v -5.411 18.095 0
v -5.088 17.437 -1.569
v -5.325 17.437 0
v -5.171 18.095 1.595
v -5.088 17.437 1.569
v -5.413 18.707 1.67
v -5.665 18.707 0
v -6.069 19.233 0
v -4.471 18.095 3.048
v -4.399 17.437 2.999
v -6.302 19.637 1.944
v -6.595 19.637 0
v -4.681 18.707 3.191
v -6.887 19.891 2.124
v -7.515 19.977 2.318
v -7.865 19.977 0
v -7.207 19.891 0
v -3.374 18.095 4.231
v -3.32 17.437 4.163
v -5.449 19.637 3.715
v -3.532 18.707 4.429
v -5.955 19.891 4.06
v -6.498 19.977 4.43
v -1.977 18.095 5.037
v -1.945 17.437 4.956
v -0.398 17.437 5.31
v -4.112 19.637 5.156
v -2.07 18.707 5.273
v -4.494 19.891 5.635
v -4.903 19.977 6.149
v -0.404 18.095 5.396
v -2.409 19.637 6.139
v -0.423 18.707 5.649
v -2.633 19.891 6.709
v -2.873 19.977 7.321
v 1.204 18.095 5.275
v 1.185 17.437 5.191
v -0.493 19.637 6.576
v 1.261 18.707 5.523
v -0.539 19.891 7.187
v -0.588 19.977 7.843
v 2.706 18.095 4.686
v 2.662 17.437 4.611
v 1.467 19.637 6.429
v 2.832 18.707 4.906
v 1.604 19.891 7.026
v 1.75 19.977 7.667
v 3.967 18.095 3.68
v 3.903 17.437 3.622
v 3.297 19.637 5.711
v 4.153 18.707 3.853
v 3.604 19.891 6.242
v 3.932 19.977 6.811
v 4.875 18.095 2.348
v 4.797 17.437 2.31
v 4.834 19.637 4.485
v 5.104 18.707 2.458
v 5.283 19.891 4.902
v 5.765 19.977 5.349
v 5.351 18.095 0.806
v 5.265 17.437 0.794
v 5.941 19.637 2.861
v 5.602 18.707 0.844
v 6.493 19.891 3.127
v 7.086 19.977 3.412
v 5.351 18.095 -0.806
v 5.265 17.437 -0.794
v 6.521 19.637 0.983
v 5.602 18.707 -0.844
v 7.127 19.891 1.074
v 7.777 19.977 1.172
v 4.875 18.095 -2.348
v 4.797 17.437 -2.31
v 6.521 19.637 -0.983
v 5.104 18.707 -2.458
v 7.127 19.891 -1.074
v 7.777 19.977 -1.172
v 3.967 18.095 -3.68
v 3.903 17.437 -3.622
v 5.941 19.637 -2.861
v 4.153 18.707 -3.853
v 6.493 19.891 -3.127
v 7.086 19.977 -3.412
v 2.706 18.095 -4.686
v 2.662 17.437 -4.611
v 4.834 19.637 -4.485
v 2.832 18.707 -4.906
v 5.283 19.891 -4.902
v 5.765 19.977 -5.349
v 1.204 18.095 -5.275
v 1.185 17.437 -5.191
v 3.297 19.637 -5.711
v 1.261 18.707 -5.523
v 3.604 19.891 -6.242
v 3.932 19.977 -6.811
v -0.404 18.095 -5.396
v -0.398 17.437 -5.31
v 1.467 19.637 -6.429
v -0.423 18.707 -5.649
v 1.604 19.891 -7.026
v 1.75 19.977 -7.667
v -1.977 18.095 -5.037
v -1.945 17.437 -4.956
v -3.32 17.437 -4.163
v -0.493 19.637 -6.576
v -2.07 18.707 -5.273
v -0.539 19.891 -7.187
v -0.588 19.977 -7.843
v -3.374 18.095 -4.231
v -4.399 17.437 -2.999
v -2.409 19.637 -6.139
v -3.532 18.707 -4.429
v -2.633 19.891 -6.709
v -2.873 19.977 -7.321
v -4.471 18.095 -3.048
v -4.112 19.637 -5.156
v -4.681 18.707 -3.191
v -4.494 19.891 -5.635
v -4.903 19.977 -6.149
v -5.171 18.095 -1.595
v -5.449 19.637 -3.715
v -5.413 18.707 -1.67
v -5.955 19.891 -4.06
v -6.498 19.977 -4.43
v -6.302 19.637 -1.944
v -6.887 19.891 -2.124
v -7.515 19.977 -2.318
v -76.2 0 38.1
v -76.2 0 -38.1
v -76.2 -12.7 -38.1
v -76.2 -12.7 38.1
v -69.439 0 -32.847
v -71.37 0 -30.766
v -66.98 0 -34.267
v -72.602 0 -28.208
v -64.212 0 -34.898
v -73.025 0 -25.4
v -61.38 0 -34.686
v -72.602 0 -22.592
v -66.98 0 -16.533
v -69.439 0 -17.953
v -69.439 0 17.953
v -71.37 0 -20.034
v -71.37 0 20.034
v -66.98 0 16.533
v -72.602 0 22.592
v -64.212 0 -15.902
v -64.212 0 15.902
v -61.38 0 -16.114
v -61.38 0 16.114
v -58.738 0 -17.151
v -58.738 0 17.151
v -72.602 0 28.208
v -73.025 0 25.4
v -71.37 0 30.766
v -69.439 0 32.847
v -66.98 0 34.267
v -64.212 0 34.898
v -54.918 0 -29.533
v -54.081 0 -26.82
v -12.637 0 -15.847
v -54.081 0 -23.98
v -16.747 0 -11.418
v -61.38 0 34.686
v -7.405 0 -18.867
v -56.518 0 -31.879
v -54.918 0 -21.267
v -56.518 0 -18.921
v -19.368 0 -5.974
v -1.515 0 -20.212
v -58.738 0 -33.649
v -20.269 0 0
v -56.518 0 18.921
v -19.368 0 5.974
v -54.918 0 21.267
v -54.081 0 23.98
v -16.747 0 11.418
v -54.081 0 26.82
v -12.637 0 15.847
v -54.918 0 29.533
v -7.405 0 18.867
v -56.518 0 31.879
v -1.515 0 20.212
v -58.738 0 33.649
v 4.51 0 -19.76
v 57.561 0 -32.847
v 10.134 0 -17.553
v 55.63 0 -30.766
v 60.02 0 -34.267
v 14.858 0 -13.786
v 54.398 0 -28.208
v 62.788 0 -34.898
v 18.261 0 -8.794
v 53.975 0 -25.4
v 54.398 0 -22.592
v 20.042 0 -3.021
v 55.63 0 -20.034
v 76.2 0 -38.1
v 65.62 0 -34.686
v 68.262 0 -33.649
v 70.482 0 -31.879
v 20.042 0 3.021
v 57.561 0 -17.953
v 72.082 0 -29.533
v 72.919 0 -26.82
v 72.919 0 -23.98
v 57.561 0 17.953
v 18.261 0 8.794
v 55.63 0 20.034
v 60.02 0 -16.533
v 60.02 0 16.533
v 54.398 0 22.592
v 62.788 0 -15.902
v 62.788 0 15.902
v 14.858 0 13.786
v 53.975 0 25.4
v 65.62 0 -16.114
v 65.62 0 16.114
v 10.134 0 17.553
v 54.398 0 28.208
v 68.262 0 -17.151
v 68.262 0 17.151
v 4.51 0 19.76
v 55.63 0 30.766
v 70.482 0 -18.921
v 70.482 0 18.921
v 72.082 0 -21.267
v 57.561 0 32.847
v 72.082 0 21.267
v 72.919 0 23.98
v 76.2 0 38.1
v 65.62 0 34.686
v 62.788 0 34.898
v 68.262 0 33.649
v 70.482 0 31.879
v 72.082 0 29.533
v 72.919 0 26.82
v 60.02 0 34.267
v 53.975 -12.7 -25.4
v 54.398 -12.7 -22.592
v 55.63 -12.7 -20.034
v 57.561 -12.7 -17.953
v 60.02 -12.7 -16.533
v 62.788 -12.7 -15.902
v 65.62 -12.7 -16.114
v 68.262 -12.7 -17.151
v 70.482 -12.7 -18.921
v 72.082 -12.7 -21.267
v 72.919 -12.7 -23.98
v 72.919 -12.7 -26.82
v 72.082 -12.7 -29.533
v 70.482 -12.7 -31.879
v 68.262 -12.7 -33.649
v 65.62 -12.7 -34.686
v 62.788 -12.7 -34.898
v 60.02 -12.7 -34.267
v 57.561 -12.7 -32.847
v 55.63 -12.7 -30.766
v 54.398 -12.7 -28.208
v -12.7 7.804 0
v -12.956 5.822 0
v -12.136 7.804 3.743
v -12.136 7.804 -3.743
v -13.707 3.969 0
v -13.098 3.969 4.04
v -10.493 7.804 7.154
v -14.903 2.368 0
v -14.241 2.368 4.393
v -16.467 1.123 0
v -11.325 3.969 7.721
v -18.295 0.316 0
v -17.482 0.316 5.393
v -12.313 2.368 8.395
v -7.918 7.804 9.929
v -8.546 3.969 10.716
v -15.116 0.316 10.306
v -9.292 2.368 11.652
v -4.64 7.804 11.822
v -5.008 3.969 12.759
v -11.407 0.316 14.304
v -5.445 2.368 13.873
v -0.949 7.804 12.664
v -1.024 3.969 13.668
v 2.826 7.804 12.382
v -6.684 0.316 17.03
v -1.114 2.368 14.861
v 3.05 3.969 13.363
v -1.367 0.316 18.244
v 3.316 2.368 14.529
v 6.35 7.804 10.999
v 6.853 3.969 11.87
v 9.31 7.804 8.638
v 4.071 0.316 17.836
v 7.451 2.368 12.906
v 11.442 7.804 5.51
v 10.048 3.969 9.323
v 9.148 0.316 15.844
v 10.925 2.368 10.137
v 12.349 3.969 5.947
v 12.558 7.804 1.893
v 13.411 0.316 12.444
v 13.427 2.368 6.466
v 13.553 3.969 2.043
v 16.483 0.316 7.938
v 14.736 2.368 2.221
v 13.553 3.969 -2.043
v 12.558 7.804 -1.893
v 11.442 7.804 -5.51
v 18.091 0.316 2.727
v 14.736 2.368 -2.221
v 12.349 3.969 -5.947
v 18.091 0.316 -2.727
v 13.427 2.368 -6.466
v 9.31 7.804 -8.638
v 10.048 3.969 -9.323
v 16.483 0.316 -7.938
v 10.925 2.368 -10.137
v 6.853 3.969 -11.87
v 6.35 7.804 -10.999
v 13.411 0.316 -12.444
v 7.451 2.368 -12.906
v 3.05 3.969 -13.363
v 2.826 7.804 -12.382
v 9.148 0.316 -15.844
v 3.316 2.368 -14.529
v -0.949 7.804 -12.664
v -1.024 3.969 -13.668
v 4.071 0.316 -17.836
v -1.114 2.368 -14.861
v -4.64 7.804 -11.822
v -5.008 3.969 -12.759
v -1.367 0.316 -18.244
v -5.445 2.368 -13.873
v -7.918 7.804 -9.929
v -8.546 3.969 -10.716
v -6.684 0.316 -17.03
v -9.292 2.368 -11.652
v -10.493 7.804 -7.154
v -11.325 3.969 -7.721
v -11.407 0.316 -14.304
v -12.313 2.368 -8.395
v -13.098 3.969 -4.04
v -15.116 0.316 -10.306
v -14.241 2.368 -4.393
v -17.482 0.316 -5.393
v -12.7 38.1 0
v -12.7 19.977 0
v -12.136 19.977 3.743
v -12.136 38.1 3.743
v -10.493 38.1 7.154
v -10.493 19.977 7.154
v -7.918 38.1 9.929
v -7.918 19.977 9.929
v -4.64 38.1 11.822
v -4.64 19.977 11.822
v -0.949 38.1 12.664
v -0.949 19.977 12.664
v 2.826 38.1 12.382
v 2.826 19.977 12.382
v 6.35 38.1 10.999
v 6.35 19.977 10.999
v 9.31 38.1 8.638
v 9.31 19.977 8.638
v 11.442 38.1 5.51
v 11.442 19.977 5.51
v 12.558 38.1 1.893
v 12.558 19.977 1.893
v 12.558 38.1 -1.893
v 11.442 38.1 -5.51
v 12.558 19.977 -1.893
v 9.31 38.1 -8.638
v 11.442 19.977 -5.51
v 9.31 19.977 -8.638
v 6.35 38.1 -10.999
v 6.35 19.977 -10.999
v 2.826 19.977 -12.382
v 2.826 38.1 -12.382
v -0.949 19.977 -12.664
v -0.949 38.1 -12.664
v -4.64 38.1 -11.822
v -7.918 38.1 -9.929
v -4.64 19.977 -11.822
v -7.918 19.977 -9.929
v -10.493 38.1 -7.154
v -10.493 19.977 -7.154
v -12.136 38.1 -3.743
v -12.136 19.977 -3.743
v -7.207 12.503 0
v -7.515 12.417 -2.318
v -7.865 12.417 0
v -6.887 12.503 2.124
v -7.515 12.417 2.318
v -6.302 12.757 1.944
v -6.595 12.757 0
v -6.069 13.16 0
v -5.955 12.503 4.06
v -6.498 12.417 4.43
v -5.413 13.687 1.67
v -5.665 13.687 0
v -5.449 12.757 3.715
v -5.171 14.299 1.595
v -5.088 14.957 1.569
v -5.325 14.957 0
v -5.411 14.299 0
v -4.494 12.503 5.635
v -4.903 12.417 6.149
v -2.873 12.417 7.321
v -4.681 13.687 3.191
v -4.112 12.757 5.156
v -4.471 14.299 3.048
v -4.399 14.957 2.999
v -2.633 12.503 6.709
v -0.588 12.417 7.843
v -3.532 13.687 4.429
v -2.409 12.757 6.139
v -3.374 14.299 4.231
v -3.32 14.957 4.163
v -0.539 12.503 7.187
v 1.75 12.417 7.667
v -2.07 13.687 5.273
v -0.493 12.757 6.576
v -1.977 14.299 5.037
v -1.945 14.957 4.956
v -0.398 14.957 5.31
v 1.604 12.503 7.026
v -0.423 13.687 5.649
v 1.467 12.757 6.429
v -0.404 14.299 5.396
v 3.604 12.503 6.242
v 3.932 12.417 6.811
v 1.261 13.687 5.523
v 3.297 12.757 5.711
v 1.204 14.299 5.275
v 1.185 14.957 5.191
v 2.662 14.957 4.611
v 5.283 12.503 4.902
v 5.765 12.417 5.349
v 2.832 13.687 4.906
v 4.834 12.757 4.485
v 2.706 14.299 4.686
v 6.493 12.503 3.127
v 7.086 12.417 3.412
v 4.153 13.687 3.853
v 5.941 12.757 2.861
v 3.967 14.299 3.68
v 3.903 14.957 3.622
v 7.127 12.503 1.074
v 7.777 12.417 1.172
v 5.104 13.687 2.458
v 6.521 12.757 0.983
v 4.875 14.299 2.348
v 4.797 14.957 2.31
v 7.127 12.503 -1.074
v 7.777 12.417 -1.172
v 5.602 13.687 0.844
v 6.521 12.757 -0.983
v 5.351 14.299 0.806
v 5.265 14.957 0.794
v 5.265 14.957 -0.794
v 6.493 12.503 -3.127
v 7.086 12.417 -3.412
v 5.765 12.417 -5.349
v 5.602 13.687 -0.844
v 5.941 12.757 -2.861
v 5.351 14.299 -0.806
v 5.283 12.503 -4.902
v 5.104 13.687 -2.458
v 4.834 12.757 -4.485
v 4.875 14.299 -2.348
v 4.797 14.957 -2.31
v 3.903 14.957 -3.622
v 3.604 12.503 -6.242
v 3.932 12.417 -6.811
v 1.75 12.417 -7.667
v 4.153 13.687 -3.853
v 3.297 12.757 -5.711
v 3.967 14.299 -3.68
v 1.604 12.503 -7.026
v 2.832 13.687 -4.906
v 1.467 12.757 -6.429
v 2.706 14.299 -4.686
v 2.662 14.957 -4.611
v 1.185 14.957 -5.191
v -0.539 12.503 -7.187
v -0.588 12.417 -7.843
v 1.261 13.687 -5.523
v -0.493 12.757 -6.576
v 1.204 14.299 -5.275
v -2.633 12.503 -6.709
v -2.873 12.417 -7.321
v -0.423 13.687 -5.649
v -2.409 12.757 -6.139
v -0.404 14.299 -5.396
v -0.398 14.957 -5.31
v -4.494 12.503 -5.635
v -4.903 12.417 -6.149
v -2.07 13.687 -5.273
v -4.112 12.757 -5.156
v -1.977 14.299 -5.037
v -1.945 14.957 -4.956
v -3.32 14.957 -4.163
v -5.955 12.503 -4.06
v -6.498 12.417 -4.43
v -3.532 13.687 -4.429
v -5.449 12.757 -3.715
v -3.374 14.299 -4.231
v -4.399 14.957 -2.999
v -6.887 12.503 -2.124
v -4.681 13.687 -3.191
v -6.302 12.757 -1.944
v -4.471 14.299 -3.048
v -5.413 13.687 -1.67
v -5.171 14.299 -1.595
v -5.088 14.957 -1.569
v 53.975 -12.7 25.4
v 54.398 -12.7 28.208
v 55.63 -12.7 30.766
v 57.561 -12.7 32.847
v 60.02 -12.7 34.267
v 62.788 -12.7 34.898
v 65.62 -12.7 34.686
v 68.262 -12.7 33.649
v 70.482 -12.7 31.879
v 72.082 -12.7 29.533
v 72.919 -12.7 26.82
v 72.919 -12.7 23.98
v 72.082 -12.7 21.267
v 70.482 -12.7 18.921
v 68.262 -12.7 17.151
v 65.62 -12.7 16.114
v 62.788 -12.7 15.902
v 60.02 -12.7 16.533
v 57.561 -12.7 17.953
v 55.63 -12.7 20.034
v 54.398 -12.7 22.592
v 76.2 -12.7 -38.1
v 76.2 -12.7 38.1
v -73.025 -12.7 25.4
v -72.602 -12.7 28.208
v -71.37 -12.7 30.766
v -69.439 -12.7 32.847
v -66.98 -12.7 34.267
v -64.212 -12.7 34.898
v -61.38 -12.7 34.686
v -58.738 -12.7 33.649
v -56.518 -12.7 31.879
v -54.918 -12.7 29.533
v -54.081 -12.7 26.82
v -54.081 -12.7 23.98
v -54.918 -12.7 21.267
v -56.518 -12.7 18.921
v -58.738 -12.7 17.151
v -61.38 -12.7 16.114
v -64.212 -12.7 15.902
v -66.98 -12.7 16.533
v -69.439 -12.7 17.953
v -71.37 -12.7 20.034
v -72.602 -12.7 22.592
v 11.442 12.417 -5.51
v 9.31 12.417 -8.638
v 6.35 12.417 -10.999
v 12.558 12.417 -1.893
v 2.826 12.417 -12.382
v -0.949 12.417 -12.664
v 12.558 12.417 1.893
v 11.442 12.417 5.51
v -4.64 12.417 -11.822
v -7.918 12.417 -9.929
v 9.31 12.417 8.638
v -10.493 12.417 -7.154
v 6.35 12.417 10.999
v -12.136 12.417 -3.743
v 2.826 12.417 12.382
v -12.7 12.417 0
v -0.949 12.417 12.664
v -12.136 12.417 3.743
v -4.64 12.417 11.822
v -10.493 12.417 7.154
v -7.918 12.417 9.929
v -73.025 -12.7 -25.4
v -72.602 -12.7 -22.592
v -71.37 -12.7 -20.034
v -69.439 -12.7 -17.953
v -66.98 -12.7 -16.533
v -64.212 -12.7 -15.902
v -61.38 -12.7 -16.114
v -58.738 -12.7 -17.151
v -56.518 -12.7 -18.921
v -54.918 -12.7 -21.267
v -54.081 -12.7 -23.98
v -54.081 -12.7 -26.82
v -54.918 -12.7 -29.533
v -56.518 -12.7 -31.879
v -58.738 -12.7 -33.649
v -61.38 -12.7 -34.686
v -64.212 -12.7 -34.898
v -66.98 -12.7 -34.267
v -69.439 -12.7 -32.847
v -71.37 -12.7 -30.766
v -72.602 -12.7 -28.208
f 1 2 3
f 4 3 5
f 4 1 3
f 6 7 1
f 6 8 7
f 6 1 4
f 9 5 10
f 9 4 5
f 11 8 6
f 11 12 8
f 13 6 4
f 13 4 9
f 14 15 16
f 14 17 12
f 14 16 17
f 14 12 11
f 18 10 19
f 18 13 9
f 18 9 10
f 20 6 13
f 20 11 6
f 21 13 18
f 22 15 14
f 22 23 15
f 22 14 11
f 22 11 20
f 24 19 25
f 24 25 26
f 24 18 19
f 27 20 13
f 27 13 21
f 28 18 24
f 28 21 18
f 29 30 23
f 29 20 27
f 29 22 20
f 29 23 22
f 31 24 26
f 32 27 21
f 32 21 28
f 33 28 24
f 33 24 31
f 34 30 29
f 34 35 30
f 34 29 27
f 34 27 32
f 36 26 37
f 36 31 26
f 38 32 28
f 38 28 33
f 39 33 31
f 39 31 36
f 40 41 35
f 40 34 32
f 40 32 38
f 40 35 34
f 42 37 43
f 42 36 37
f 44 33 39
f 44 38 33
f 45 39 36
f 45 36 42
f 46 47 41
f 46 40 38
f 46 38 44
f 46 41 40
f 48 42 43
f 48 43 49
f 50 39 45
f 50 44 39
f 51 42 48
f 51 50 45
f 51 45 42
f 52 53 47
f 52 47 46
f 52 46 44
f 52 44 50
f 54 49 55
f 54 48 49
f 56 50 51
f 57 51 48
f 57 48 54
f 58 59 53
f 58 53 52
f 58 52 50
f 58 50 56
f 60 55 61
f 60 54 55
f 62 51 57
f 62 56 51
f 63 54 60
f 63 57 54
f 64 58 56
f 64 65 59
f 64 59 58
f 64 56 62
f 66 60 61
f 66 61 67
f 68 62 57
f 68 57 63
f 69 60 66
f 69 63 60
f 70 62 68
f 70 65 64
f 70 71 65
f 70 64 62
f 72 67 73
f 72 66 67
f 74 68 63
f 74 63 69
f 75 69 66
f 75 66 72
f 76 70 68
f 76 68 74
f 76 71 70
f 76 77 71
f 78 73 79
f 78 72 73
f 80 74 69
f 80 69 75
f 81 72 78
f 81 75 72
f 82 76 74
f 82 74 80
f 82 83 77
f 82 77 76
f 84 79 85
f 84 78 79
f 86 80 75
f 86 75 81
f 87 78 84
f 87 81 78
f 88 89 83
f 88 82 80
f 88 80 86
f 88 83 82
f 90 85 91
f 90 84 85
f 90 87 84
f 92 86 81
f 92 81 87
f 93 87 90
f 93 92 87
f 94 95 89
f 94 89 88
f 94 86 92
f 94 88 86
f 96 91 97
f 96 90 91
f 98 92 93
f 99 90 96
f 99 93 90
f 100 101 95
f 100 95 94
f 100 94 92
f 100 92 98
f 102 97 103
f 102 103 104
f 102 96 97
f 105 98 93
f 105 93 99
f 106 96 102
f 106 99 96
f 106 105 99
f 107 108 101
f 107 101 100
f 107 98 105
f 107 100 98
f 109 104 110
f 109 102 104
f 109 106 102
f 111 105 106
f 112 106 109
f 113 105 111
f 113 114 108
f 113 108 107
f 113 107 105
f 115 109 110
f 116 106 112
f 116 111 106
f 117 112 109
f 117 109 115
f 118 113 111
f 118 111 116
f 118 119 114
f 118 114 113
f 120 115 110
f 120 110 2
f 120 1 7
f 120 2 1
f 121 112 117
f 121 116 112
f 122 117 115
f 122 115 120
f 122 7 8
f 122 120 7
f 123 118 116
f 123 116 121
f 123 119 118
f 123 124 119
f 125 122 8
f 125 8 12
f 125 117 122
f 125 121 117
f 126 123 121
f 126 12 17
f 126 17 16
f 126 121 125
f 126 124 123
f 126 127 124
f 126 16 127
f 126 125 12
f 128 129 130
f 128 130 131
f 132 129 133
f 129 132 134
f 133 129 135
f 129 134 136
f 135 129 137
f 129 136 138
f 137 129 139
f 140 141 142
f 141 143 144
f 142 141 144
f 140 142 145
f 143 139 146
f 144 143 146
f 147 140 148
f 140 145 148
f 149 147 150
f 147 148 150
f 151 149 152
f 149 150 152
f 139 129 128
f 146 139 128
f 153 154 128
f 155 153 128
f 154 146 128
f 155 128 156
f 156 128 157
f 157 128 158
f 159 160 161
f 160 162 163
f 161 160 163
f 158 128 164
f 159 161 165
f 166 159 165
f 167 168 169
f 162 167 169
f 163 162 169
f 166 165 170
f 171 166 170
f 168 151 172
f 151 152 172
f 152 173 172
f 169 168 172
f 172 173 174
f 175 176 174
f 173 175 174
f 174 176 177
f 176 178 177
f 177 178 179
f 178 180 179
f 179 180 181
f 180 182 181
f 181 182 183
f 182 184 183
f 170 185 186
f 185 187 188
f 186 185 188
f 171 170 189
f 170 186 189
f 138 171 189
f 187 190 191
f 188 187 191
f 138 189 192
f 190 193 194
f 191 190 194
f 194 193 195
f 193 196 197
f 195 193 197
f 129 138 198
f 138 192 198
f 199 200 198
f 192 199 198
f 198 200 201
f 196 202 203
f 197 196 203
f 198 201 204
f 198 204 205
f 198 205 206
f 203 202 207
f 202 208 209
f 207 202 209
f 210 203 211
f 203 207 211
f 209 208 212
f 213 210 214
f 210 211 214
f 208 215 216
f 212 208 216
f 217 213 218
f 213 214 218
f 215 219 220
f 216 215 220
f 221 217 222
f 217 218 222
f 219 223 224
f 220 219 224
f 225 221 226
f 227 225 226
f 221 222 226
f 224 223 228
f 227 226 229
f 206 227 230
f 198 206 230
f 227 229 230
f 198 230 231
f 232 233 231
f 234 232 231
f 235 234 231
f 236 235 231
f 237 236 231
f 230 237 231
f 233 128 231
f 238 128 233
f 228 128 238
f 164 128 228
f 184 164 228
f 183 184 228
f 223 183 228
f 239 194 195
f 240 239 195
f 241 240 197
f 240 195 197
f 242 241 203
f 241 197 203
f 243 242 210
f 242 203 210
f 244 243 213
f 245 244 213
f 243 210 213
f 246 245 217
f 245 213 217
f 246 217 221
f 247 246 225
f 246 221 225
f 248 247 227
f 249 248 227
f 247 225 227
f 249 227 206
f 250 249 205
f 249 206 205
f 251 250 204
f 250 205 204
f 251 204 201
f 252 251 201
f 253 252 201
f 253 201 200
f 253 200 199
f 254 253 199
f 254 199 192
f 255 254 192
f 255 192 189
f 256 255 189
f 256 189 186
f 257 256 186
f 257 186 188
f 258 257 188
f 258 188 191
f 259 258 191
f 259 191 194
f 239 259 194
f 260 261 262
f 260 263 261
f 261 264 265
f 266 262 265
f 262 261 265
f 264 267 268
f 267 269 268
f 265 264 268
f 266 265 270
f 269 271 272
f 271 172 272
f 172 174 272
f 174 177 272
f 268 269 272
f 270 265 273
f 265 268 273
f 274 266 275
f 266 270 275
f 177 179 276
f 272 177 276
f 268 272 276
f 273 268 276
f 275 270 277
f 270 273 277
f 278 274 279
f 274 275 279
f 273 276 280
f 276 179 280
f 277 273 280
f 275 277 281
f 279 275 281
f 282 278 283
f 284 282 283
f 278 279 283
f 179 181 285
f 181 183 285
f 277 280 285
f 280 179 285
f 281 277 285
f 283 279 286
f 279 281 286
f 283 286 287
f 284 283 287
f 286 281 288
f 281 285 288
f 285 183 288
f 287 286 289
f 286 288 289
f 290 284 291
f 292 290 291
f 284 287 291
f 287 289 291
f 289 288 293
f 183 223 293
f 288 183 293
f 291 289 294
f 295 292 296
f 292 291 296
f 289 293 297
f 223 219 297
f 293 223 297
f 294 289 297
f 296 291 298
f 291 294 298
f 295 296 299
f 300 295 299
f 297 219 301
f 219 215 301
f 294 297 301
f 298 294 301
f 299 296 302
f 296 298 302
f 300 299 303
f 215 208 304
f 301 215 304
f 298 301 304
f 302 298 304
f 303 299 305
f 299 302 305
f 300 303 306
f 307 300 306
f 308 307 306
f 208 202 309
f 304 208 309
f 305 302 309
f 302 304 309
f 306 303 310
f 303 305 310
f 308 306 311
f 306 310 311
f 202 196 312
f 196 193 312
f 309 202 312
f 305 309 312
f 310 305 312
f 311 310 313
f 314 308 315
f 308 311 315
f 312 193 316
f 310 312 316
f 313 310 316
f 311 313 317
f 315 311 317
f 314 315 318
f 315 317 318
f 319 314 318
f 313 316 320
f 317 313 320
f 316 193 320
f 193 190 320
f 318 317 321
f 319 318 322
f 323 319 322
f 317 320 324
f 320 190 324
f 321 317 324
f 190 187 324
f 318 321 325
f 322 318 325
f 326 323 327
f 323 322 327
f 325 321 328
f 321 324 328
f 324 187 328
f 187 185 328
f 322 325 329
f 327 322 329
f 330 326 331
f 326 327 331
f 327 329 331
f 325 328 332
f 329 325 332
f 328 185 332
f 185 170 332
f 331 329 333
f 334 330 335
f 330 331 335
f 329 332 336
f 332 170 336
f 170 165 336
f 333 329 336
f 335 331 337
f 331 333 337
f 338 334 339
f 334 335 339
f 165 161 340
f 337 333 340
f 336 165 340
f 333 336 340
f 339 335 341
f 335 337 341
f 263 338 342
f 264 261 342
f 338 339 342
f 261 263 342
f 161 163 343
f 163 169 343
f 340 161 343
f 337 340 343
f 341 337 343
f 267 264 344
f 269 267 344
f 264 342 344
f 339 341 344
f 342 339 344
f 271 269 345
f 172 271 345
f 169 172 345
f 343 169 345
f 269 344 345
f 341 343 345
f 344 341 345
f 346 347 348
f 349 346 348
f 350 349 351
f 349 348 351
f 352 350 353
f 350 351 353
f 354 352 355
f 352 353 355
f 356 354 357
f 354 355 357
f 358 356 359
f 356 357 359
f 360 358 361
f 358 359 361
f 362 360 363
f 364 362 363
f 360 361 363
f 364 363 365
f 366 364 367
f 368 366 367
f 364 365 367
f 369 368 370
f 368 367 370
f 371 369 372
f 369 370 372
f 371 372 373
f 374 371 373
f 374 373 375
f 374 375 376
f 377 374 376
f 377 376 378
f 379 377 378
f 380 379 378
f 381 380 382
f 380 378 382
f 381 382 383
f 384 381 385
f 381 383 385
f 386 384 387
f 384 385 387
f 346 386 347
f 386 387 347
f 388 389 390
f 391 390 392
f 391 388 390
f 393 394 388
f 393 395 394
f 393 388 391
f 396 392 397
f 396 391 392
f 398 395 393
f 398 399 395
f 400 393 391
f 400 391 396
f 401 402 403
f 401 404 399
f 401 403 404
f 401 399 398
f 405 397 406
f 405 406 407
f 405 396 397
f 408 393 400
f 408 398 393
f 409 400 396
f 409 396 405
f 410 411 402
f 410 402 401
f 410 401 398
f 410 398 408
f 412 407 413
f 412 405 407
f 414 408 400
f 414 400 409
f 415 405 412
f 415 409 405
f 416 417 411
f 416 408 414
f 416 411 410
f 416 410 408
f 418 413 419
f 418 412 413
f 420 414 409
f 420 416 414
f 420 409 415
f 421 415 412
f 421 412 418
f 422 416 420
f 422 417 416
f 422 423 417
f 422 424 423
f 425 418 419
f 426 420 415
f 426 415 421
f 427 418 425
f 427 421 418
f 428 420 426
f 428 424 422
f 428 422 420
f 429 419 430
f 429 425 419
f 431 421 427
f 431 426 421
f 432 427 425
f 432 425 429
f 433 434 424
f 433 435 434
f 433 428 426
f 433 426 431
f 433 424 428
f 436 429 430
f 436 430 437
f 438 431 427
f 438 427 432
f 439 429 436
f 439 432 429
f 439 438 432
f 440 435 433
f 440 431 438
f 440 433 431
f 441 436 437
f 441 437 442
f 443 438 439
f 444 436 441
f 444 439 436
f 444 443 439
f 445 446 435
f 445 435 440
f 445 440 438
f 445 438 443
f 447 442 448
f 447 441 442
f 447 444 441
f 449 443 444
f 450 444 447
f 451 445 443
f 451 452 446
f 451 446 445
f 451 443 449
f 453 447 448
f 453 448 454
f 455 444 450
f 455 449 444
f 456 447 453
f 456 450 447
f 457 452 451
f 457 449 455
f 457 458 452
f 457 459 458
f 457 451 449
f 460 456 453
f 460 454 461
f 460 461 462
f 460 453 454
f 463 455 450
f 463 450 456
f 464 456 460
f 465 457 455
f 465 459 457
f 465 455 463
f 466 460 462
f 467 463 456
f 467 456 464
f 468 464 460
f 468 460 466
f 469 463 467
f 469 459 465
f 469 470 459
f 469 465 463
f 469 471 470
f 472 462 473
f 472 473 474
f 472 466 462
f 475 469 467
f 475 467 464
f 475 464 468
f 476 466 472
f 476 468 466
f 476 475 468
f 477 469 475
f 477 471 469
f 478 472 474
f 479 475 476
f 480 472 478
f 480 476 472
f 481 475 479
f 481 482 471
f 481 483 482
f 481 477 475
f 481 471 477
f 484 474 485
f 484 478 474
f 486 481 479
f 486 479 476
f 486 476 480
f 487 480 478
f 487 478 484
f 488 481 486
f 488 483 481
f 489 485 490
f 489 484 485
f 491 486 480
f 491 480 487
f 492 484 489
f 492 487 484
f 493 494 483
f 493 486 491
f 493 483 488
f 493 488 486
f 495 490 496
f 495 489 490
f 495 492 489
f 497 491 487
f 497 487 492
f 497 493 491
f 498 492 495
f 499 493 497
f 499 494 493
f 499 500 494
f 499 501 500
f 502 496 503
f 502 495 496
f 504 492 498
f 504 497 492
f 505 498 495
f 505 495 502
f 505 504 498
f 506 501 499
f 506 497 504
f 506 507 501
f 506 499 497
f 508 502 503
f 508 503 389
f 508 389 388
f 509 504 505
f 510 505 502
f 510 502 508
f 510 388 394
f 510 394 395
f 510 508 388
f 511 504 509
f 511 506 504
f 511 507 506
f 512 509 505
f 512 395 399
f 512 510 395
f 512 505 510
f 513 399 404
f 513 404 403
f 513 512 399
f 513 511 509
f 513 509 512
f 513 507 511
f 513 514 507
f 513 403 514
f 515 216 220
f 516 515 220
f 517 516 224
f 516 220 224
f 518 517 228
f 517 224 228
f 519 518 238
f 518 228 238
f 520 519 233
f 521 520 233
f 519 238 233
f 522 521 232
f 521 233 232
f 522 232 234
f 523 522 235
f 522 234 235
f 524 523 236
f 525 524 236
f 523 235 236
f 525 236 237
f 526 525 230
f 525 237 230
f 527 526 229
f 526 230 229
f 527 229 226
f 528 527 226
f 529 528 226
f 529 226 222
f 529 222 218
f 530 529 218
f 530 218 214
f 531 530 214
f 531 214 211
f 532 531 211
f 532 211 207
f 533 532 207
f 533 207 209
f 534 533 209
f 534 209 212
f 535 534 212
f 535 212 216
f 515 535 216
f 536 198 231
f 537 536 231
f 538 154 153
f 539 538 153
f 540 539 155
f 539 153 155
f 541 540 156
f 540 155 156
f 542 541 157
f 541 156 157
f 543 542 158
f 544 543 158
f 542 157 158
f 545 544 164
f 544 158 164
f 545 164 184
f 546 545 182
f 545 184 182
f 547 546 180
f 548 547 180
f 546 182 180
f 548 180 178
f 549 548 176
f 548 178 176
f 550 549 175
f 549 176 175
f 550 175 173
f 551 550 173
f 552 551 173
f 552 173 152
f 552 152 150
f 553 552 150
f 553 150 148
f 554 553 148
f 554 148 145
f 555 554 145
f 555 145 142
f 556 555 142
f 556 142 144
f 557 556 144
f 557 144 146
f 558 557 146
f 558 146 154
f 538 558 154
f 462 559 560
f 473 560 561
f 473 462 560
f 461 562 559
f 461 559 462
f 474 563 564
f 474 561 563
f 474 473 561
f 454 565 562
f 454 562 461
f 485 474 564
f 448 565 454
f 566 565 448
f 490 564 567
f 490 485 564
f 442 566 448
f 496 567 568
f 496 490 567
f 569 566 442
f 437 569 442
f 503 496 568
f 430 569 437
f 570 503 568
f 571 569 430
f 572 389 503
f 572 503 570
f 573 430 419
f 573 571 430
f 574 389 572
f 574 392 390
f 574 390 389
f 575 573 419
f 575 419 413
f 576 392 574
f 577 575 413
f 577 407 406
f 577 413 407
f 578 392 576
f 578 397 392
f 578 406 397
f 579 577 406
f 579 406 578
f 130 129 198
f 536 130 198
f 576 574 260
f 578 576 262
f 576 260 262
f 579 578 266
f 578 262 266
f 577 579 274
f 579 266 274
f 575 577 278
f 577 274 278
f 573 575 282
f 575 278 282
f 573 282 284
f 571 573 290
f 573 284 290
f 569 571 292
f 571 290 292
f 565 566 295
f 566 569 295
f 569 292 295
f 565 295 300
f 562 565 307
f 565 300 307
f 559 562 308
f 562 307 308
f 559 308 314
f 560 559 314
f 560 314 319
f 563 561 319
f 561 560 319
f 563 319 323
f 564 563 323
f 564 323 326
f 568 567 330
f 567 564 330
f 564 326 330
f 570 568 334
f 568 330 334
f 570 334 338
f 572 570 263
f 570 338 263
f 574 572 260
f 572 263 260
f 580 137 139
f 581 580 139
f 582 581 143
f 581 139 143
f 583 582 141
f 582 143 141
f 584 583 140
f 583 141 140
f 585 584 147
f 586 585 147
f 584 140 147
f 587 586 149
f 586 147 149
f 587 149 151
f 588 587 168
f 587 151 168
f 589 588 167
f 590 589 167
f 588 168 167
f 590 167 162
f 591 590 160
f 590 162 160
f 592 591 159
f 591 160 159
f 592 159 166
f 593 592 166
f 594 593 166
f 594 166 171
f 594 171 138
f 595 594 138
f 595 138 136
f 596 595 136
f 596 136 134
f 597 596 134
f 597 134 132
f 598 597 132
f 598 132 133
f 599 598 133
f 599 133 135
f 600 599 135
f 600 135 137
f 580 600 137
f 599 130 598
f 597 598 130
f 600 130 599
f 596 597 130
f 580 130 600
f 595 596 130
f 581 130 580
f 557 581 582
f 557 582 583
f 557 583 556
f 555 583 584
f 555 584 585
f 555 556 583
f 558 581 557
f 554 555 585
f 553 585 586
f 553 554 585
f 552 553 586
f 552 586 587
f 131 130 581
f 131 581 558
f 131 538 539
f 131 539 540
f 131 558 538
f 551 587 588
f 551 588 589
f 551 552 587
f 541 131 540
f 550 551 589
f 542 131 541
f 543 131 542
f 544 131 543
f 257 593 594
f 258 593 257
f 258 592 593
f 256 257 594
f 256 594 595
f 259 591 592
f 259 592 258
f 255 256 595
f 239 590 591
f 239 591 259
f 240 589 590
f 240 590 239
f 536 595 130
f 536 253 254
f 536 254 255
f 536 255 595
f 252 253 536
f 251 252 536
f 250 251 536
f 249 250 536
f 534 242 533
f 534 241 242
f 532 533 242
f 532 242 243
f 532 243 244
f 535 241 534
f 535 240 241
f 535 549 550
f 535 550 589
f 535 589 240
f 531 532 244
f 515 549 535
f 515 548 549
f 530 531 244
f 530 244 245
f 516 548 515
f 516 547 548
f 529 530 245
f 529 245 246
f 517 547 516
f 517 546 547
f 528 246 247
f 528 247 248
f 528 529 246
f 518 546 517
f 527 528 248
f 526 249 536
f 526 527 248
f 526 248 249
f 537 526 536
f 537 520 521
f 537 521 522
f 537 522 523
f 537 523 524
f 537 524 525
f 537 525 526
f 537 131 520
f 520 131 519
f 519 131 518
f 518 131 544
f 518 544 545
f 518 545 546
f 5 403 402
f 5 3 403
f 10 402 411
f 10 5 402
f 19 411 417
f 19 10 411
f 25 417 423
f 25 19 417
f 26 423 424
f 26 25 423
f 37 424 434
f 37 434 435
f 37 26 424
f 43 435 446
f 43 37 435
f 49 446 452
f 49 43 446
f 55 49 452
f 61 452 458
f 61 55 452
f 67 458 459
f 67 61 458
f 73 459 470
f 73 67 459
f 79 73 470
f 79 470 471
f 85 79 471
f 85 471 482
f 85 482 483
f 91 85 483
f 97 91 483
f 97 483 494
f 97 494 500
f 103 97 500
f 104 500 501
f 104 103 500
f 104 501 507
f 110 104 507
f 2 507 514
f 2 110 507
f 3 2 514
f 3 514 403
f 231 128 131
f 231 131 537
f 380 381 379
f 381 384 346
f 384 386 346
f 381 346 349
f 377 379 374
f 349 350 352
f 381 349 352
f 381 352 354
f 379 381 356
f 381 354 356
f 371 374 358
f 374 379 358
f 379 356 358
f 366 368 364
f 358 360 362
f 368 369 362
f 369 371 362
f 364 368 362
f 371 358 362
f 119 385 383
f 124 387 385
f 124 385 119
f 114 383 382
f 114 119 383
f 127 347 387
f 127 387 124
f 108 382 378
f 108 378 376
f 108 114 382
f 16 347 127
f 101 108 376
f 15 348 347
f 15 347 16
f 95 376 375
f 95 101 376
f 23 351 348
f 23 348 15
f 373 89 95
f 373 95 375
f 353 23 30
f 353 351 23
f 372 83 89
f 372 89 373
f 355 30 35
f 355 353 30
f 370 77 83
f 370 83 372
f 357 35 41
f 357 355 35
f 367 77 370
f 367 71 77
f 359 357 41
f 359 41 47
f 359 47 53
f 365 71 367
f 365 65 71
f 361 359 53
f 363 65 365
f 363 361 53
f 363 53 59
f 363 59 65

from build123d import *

# Parameters (mm, degrees)
F0_W     = 152.4
F0_H     = 76.2
F1_DEPTH = 12.7
F2_R     = 9.525
F3_DEPTH = 12.701


with BuildPart() as f1:
    # F0 (on Front) → F1 (new body)
    with BuildSketch(Plane.XZ):
        Rectangle(F0_W, F0_H)
    extrude(amount=F1_DEPTH)

    # F2 (on face) → F3 (cut, through all)
    with BuildSketch(Plane(origin=(0, 0, 0), x_dir=(-1, 0, 0), z_dir=(0, 1, 0))):
        with Locations((63.5, 25.4)):
            Circle(F2_R)
        with Locations((63.5, -25.4)):
            Circle(F2_R)
        with Locations((-63.5, -25.4)):
            Circle(F2_R)
        with Locations((-63.5, 25.4)):
            Circle(F2_R)
    extrude(amount=-F3_DEPTH, mode=Mode.SUBTRACT)

    # F4 (on Top) → F5 (revolve)
    with BuildSketch(Plane.XY):
        with BuildLine():
            ThreePointArc((-20.746347, 0), (-20.507447, -0.003656), (-20.268548, 0))
            Line((-20.268548, 0), (-20.746347, 0))
        make_face()
        Polygon((-12.7, 0), (0, 0), (0, 38.1), (-12.7, 38.1), (-12.7, 7.803791), align=None)
        with BuildLine():
            Line((-20.268548, 0), (-12.7, 0))
            Line((-12.7, 0), (-12.7, 7.803791))
            ThreePointArc((-12.7, 7.803791), (-14.902921, 2.368212), (-20.268548, 0))
        make_face()
    revolve(axis=Axis((0, 19.05, 0), (0, 1, 0)))

    # F6 (on Top) → F7 (revolve, cut)
    with BuildSketch(Plane.XY):
        with BuildLine():
            Line((-15.973667, 12.416507), (-7.864556, 12.416507))
            ThreePointArc((-7.864556, 12.416507), (-6.068504, 13.160456), (-5.324556, 14.956507))
            Line((-5.324556, 14.956507), (-5.324556, 17.437313))
            ThreePointArc((-5.324556, 17.437313), (-6.068504, 19.233365), (-7.864556, 19.977313))
            Line((-7.864556, 19.977313), (-15.973667, 19.977313))
            Line((-15.973667, 19.977313), (-15.973667, 12.416507))
        make_face()
    revolve(axis=Axis((0, 8.098455, 0), (0, 1, 0)), mode=Mode.SUBTRACT)


solid = f1.part
